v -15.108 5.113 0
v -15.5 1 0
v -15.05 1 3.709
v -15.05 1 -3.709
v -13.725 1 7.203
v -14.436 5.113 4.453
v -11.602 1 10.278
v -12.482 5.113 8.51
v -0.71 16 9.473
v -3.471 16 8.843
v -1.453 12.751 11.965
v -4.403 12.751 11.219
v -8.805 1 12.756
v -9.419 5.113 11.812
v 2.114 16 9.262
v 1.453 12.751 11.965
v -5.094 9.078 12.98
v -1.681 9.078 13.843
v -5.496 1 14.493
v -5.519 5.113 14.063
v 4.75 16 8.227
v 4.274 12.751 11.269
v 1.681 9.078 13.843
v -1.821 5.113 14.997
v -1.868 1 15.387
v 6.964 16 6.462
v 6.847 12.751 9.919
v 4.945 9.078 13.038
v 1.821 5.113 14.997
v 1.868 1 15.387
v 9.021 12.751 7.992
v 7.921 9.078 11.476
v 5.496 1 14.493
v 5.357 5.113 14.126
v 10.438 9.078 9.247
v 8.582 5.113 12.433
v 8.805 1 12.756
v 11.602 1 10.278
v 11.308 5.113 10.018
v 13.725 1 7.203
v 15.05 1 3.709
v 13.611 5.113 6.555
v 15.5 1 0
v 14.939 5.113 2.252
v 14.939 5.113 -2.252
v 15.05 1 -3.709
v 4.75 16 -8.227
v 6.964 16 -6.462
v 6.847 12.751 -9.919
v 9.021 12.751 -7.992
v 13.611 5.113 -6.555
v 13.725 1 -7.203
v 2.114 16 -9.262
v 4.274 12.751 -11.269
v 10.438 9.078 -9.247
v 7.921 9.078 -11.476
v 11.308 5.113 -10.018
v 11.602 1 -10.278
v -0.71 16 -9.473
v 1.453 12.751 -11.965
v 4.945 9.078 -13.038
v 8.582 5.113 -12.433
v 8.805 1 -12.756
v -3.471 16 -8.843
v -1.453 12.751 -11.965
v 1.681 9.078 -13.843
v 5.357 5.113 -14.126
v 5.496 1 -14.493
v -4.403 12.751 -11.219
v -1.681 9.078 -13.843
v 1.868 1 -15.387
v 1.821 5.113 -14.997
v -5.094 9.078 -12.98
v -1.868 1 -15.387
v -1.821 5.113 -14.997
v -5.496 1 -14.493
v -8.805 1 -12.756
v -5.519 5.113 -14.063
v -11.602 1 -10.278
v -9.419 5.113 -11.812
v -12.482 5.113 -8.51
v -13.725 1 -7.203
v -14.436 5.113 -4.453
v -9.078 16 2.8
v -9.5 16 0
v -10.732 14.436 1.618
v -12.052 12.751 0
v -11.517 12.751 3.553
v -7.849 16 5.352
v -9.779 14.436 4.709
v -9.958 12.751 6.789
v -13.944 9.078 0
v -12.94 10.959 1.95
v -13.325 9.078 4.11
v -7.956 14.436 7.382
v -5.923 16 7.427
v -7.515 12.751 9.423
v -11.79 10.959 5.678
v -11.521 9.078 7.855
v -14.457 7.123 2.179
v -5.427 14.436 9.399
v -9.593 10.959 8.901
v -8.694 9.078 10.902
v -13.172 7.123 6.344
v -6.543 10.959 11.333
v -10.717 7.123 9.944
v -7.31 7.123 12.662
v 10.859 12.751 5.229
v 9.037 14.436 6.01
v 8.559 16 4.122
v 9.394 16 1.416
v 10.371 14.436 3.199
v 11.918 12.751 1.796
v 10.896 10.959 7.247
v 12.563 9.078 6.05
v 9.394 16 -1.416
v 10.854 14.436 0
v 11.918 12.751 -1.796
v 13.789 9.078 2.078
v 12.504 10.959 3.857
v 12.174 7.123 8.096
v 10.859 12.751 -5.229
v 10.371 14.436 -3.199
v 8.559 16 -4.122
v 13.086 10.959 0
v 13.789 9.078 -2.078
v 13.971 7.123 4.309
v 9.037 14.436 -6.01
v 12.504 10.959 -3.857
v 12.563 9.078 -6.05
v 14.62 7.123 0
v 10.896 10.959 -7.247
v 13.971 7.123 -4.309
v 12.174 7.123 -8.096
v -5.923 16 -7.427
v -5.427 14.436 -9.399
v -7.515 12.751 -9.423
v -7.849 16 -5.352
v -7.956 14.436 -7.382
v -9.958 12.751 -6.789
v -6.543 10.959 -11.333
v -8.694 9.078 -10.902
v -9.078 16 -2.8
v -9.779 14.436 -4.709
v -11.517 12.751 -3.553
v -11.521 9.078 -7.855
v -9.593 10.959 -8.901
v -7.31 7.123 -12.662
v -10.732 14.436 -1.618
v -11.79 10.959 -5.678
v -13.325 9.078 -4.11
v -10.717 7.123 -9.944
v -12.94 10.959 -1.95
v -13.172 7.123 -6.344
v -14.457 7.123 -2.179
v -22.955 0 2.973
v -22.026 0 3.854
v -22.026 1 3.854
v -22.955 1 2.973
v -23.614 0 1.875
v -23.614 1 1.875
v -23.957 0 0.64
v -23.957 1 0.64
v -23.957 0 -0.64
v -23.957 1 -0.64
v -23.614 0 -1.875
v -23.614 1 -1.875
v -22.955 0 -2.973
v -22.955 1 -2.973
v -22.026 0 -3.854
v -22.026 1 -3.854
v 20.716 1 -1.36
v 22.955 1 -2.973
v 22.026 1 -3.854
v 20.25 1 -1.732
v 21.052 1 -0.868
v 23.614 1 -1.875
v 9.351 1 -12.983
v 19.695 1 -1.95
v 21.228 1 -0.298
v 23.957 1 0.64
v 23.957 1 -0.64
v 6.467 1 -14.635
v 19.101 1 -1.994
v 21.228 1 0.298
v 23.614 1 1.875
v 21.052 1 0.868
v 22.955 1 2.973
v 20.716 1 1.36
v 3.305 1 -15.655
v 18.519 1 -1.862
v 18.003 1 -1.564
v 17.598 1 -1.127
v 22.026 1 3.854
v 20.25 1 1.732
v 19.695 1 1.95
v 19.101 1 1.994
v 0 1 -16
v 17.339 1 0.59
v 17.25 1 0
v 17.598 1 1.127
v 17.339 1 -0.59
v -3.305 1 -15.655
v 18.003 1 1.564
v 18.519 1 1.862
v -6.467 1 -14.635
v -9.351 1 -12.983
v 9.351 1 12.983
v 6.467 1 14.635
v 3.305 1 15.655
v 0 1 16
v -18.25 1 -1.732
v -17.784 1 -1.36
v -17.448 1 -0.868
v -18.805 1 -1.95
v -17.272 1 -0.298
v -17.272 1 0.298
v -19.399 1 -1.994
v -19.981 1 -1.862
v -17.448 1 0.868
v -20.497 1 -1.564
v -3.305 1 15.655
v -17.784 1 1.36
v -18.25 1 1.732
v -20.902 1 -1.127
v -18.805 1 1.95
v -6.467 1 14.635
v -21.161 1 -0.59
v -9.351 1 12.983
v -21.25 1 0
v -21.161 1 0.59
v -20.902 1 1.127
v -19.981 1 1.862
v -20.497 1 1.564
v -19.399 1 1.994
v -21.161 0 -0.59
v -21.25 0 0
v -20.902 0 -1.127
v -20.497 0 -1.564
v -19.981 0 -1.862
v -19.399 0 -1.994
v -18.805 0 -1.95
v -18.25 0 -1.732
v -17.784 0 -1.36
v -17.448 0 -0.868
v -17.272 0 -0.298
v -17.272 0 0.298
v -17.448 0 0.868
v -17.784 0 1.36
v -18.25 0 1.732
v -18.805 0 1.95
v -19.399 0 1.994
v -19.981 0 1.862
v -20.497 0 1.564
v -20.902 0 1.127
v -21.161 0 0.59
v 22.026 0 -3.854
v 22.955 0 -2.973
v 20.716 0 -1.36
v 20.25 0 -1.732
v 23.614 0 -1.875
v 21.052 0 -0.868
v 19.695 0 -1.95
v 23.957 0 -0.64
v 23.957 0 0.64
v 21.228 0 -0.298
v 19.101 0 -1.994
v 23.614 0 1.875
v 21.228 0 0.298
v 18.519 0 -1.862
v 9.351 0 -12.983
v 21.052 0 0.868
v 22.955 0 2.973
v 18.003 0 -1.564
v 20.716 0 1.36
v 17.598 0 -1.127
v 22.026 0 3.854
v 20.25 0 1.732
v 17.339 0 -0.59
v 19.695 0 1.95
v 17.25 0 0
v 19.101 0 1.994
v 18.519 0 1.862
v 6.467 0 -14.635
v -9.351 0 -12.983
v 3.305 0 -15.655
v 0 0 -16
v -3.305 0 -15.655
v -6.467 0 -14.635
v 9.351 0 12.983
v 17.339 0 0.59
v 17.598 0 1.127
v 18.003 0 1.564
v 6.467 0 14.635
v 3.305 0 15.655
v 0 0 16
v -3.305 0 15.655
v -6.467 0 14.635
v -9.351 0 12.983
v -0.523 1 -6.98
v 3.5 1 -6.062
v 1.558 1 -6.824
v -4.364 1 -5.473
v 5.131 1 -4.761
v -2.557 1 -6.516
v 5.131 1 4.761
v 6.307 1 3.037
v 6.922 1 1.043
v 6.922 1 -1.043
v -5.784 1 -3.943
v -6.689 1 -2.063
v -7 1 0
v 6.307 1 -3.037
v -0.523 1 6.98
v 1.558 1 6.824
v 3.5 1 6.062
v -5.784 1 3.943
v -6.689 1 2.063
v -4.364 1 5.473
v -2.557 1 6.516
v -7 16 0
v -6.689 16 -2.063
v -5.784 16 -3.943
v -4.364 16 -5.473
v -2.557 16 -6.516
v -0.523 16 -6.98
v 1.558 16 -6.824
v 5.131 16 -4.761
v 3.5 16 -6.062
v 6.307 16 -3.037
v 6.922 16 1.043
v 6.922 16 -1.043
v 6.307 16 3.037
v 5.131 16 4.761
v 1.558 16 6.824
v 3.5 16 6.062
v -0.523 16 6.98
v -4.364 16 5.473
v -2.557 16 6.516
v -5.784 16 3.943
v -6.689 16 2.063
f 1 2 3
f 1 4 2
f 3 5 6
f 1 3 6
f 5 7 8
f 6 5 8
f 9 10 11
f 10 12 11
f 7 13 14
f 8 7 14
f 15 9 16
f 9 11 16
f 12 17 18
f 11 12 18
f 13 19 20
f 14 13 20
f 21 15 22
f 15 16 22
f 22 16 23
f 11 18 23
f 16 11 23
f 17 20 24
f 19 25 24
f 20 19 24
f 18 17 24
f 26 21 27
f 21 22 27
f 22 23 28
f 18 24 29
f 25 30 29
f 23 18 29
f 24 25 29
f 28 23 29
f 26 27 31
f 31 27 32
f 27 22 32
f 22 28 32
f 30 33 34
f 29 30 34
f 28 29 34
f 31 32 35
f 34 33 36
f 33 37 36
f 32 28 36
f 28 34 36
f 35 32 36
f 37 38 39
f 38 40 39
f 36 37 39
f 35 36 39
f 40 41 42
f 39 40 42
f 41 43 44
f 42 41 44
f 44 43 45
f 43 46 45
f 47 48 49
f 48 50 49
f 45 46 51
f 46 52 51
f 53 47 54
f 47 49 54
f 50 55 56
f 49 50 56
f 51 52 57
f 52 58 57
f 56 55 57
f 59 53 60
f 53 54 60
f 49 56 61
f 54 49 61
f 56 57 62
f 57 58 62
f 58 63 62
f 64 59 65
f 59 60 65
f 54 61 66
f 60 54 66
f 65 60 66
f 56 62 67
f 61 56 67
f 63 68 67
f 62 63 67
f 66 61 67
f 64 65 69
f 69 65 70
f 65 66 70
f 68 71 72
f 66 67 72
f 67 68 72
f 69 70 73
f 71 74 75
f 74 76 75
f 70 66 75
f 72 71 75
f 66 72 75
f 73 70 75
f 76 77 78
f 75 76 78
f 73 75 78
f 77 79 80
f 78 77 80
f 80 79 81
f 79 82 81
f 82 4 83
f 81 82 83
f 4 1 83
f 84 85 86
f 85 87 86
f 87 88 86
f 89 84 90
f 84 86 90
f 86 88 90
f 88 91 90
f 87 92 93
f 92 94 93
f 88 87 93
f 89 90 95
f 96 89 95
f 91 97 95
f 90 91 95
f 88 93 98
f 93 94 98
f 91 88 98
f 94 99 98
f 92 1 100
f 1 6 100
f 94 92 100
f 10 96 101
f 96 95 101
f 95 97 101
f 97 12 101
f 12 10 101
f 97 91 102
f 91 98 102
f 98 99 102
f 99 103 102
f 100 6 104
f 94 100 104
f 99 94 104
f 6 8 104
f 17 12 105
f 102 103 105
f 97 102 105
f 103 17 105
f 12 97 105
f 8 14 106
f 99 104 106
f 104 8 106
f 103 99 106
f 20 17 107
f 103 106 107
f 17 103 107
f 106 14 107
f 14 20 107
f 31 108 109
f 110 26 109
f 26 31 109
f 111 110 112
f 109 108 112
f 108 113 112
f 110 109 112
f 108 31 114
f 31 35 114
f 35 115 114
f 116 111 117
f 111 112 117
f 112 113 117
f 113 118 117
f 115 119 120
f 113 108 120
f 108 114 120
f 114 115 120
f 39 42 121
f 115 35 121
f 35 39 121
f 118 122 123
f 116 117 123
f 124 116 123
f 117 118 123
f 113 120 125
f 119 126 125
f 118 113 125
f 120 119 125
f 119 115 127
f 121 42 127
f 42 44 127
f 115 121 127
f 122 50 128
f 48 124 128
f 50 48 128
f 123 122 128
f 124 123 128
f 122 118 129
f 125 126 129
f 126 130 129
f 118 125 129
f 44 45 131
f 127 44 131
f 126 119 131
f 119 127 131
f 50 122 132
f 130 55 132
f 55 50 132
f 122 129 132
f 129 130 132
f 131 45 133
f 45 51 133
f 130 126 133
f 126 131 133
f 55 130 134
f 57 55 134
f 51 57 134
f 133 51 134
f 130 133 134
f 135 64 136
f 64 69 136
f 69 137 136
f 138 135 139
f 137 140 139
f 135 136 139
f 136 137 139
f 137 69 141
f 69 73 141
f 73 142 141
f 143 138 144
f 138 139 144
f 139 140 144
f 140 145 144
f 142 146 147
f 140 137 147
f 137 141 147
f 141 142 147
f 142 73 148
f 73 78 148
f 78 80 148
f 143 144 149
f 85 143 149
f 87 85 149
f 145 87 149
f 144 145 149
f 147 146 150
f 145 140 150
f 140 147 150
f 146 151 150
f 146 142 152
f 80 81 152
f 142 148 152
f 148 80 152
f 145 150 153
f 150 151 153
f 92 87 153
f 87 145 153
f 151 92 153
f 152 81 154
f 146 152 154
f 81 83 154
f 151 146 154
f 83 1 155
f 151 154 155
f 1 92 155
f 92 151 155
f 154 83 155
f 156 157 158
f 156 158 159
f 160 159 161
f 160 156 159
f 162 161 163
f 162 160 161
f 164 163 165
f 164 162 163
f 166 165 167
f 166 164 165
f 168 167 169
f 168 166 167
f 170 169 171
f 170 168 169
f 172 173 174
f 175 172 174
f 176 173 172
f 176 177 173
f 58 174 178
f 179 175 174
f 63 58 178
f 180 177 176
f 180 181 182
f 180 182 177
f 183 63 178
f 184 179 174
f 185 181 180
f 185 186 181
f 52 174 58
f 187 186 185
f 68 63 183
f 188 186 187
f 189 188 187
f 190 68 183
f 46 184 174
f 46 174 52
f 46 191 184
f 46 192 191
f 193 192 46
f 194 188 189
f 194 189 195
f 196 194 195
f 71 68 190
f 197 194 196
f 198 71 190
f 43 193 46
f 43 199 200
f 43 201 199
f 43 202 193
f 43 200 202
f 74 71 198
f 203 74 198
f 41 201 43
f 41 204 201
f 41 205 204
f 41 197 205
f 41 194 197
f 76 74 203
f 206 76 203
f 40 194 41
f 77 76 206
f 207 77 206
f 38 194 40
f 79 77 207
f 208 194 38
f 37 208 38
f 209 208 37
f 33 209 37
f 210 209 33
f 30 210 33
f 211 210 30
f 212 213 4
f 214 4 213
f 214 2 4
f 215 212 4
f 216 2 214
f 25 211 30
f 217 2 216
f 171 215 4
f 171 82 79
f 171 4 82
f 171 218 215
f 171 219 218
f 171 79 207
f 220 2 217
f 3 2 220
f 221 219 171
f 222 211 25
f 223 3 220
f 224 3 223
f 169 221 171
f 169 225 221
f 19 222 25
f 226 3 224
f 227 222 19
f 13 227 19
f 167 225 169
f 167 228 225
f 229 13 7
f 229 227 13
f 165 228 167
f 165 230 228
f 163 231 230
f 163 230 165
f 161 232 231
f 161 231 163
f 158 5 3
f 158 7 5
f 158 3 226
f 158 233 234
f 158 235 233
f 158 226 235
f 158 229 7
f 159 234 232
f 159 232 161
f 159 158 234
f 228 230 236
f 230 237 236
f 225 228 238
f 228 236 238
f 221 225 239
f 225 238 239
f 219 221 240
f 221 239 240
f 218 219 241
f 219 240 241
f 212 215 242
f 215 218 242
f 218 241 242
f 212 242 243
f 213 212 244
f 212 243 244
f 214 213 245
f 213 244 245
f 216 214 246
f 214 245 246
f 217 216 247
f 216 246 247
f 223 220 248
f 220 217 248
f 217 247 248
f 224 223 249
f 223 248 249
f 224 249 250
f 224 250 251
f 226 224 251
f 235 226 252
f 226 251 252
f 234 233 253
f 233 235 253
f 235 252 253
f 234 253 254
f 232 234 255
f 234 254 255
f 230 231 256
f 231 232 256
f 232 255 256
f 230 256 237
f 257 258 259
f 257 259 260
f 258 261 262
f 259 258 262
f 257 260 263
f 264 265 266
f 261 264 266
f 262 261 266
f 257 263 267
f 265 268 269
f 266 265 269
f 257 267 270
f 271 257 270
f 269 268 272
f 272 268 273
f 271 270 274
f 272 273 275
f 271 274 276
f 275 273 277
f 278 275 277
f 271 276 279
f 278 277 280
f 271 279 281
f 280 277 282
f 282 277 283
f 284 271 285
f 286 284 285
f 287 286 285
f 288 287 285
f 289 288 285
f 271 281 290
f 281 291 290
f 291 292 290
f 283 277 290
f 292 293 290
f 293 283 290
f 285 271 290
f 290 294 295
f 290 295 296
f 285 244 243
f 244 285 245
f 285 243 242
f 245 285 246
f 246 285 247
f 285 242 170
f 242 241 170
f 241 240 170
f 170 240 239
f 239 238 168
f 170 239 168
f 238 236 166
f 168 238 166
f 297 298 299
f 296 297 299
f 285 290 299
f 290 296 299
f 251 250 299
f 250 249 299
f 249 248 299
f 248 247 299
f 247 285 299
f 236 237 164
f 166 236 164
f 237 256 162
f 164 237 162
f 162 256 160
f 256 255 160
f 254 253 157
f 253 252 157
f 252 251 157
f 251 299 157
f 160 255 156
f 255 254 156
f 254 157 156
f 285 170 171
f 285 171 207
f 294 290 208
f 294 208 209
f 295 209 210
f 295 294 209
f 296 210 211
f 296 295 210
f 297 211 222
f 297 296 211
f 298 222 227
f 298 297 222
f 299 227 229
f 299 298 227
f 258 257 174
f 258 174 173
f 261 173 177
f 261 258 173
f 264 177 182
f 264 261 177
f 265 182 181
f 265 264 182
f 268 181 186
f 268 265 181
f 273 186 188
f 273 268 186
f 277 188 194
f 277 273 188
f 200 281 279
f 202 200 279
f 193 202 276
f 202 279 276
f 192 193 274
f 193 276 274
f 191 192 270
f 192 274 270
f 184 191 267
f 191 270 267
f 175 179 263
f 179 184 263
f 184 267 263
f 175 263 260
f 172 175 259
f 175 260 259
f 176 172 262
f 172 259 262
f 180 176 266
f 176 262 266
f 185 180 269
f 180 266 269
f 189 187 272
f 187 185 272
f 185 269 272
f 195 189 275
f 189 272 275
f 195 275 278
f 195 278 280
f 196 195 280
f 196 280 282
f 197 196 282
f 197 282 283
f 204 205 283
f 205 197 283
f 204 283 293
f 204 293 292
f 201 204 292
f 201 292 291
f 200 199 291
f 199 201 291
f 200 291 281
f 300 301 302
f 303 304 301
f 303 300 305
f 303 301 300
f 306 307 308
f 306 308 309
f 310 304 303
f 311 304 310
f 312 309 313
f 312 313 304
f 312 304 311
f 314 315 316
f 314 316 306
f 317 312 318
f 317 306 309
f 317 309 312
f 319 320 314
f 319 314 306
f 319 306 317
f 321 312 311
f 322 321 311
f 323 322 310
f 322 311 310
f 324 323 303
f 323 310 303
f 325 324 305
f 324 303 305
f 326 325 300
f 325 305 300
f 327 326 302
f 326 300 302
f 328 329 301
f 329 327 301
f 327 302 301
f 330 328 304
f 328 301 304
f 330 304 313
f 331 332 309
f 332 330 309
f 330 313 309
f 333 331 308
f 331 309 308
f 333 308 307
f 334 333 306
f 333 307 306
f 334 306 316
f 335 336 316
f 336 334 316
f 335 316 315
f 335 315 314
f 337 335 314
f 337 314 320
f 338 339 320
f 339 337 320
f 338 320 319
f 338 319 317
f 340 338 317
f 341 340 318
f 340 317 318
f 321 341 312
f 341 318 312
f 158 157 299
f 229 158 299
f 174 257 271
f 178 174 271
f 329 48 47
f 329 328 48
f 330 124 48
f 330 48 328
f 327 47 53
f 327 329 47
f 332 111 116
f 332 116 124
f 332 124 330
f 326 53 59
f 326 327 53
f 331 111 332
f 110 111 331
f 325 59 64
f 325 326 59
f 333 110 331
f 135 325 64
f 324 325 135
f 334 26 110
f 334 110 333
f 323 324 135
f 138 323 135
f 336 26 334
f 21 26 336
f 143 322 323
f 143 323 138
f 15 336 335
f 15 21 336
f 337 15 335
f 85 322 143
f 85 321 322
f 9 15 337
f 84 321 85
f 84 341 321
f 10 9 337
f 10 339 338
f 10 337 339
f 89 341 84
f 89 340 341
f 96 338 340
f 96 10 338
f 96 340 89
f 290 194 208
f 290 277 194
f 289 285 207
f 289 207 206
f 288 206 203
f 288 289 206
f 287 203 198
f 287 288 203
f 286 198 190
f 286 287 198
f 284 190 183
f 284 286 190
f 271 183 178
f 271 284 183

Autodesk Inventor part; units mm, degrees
ref_plane "YZ Plane" through (0, 0, 0) normal (1, 0, 0) x (0, 1, 0)
ref_plane "XZ Plane" through (0, 0, 0) normal (0, 1, 0) x (-1, 0, 0)
ref_plane "XY Plane" through (0, 0, 0) normal (0, 0, 1) x (1, 0, 0)
sketch "Sketch1" plane through (0, 0, 0) normal (0, 1, 0) x (-1, 0, 0)
  circle A0 centre (19.25, 0) radius 2
  line L0 (0, 16) -> (0, -26.1596) construction
  arc A1 (22.026, -3.8544) -> (22.026, 3.8544) centre (19.25, 0) ccw
  line L1 (22.026, -3.8544) -> (9.3506, -12.9833)
  line L2 (22.026, 3.8544) -> (9.3506, 12.9833)
  line L3 (0, 0) -> (7.2695, 0) construction
  circle A2 centre (-19.25, 0) radius 2
  arc A3 (-22.026, 3.8544) -> (-22.026, -3.8544) centre (-19.25, 0) ccw
  line L4 (-22.026, -3.8544) -> (-9.3506, -12.9833)
  line L5 (-22.026, 3.8544) -> (-9.3506, 12.9833)
  arc A4 (9.3506, 12.9833) -> (-9.3506, 12.9833) centre (0, 0) ccw
  arc A5 (-9.3506, -12.9833) -> (9.3506, -12.9833) centre (0, 0) ccw
  point P0 (-7.2695, 0)
  dimension "d1" = 4
  dimension "d3" = 38.5
  dimension "d6" = 48
  dimension "d9" = 16
  dimension "d10" = 16
extrude "Extrusion1" add sketch "Sketch1" along normal blind 1
sketch "Sketch3" plane through (0, 0, 0) normal (0, 0, 1) x (1, 0, 0)
  line L0 (-17.25, 0) -> (-17.25, 1) projected
  line L1 (-17.25, 1) -> (17.25, 1) projected
  line L2 (17.25, 1) -> (17.25, 0) projected
  line L3 (17.25, 0) -> (-17.25, 0) projected
  line L4 (24, 1) -> (24, 0) projected
  line L5 (24, 0) -> (21.25, 0) projected
  line L6 (21.25, 0) -> (21.25, 1) projected
  line L7 (21.25, 1) -> (24, 1) projected
  line L8 (-24, 0) -> (-24, 1) projected
  line L9 (-24, 1) -> (-21.25, 1) projected
  line L10 (-21.25, 1) -> (-21.25, 0) projected
  line L11 (-21.25, 0) -> (-24, 0) projected
  line L12 (0, 1) -> (0, 13.5844) construction
  line L13 (9.3506, 1) -> (-9.3506, 1) projected
  arc A0 (-9.5, 16) -> (-15.5, 1) centre (6.25, 1) ccw
  line L14 (-9.5, 16) -> (-7, 16)
  line L15 (-7, 16) -> (-7, 1)
  line L16 (-7, 1) -> (-15.5, 1)
  line L17 (-22.026, 1) -> (-9.3506, 1) projected
  point P0 (0, 0)
  dimension "d11" = 31
  dimension "d12" = 16
  dimension "d13" = 19
  dimension "d14" = 14
revolve "Revolution1" add sketch "Sketch3" angle 360 about axis through (0, 1, 0) along (0, 1, 0) contours A0 L14 L15 L1
equation "\"d10\" = d9"
properties part number "caster_wheel_v5_base"
